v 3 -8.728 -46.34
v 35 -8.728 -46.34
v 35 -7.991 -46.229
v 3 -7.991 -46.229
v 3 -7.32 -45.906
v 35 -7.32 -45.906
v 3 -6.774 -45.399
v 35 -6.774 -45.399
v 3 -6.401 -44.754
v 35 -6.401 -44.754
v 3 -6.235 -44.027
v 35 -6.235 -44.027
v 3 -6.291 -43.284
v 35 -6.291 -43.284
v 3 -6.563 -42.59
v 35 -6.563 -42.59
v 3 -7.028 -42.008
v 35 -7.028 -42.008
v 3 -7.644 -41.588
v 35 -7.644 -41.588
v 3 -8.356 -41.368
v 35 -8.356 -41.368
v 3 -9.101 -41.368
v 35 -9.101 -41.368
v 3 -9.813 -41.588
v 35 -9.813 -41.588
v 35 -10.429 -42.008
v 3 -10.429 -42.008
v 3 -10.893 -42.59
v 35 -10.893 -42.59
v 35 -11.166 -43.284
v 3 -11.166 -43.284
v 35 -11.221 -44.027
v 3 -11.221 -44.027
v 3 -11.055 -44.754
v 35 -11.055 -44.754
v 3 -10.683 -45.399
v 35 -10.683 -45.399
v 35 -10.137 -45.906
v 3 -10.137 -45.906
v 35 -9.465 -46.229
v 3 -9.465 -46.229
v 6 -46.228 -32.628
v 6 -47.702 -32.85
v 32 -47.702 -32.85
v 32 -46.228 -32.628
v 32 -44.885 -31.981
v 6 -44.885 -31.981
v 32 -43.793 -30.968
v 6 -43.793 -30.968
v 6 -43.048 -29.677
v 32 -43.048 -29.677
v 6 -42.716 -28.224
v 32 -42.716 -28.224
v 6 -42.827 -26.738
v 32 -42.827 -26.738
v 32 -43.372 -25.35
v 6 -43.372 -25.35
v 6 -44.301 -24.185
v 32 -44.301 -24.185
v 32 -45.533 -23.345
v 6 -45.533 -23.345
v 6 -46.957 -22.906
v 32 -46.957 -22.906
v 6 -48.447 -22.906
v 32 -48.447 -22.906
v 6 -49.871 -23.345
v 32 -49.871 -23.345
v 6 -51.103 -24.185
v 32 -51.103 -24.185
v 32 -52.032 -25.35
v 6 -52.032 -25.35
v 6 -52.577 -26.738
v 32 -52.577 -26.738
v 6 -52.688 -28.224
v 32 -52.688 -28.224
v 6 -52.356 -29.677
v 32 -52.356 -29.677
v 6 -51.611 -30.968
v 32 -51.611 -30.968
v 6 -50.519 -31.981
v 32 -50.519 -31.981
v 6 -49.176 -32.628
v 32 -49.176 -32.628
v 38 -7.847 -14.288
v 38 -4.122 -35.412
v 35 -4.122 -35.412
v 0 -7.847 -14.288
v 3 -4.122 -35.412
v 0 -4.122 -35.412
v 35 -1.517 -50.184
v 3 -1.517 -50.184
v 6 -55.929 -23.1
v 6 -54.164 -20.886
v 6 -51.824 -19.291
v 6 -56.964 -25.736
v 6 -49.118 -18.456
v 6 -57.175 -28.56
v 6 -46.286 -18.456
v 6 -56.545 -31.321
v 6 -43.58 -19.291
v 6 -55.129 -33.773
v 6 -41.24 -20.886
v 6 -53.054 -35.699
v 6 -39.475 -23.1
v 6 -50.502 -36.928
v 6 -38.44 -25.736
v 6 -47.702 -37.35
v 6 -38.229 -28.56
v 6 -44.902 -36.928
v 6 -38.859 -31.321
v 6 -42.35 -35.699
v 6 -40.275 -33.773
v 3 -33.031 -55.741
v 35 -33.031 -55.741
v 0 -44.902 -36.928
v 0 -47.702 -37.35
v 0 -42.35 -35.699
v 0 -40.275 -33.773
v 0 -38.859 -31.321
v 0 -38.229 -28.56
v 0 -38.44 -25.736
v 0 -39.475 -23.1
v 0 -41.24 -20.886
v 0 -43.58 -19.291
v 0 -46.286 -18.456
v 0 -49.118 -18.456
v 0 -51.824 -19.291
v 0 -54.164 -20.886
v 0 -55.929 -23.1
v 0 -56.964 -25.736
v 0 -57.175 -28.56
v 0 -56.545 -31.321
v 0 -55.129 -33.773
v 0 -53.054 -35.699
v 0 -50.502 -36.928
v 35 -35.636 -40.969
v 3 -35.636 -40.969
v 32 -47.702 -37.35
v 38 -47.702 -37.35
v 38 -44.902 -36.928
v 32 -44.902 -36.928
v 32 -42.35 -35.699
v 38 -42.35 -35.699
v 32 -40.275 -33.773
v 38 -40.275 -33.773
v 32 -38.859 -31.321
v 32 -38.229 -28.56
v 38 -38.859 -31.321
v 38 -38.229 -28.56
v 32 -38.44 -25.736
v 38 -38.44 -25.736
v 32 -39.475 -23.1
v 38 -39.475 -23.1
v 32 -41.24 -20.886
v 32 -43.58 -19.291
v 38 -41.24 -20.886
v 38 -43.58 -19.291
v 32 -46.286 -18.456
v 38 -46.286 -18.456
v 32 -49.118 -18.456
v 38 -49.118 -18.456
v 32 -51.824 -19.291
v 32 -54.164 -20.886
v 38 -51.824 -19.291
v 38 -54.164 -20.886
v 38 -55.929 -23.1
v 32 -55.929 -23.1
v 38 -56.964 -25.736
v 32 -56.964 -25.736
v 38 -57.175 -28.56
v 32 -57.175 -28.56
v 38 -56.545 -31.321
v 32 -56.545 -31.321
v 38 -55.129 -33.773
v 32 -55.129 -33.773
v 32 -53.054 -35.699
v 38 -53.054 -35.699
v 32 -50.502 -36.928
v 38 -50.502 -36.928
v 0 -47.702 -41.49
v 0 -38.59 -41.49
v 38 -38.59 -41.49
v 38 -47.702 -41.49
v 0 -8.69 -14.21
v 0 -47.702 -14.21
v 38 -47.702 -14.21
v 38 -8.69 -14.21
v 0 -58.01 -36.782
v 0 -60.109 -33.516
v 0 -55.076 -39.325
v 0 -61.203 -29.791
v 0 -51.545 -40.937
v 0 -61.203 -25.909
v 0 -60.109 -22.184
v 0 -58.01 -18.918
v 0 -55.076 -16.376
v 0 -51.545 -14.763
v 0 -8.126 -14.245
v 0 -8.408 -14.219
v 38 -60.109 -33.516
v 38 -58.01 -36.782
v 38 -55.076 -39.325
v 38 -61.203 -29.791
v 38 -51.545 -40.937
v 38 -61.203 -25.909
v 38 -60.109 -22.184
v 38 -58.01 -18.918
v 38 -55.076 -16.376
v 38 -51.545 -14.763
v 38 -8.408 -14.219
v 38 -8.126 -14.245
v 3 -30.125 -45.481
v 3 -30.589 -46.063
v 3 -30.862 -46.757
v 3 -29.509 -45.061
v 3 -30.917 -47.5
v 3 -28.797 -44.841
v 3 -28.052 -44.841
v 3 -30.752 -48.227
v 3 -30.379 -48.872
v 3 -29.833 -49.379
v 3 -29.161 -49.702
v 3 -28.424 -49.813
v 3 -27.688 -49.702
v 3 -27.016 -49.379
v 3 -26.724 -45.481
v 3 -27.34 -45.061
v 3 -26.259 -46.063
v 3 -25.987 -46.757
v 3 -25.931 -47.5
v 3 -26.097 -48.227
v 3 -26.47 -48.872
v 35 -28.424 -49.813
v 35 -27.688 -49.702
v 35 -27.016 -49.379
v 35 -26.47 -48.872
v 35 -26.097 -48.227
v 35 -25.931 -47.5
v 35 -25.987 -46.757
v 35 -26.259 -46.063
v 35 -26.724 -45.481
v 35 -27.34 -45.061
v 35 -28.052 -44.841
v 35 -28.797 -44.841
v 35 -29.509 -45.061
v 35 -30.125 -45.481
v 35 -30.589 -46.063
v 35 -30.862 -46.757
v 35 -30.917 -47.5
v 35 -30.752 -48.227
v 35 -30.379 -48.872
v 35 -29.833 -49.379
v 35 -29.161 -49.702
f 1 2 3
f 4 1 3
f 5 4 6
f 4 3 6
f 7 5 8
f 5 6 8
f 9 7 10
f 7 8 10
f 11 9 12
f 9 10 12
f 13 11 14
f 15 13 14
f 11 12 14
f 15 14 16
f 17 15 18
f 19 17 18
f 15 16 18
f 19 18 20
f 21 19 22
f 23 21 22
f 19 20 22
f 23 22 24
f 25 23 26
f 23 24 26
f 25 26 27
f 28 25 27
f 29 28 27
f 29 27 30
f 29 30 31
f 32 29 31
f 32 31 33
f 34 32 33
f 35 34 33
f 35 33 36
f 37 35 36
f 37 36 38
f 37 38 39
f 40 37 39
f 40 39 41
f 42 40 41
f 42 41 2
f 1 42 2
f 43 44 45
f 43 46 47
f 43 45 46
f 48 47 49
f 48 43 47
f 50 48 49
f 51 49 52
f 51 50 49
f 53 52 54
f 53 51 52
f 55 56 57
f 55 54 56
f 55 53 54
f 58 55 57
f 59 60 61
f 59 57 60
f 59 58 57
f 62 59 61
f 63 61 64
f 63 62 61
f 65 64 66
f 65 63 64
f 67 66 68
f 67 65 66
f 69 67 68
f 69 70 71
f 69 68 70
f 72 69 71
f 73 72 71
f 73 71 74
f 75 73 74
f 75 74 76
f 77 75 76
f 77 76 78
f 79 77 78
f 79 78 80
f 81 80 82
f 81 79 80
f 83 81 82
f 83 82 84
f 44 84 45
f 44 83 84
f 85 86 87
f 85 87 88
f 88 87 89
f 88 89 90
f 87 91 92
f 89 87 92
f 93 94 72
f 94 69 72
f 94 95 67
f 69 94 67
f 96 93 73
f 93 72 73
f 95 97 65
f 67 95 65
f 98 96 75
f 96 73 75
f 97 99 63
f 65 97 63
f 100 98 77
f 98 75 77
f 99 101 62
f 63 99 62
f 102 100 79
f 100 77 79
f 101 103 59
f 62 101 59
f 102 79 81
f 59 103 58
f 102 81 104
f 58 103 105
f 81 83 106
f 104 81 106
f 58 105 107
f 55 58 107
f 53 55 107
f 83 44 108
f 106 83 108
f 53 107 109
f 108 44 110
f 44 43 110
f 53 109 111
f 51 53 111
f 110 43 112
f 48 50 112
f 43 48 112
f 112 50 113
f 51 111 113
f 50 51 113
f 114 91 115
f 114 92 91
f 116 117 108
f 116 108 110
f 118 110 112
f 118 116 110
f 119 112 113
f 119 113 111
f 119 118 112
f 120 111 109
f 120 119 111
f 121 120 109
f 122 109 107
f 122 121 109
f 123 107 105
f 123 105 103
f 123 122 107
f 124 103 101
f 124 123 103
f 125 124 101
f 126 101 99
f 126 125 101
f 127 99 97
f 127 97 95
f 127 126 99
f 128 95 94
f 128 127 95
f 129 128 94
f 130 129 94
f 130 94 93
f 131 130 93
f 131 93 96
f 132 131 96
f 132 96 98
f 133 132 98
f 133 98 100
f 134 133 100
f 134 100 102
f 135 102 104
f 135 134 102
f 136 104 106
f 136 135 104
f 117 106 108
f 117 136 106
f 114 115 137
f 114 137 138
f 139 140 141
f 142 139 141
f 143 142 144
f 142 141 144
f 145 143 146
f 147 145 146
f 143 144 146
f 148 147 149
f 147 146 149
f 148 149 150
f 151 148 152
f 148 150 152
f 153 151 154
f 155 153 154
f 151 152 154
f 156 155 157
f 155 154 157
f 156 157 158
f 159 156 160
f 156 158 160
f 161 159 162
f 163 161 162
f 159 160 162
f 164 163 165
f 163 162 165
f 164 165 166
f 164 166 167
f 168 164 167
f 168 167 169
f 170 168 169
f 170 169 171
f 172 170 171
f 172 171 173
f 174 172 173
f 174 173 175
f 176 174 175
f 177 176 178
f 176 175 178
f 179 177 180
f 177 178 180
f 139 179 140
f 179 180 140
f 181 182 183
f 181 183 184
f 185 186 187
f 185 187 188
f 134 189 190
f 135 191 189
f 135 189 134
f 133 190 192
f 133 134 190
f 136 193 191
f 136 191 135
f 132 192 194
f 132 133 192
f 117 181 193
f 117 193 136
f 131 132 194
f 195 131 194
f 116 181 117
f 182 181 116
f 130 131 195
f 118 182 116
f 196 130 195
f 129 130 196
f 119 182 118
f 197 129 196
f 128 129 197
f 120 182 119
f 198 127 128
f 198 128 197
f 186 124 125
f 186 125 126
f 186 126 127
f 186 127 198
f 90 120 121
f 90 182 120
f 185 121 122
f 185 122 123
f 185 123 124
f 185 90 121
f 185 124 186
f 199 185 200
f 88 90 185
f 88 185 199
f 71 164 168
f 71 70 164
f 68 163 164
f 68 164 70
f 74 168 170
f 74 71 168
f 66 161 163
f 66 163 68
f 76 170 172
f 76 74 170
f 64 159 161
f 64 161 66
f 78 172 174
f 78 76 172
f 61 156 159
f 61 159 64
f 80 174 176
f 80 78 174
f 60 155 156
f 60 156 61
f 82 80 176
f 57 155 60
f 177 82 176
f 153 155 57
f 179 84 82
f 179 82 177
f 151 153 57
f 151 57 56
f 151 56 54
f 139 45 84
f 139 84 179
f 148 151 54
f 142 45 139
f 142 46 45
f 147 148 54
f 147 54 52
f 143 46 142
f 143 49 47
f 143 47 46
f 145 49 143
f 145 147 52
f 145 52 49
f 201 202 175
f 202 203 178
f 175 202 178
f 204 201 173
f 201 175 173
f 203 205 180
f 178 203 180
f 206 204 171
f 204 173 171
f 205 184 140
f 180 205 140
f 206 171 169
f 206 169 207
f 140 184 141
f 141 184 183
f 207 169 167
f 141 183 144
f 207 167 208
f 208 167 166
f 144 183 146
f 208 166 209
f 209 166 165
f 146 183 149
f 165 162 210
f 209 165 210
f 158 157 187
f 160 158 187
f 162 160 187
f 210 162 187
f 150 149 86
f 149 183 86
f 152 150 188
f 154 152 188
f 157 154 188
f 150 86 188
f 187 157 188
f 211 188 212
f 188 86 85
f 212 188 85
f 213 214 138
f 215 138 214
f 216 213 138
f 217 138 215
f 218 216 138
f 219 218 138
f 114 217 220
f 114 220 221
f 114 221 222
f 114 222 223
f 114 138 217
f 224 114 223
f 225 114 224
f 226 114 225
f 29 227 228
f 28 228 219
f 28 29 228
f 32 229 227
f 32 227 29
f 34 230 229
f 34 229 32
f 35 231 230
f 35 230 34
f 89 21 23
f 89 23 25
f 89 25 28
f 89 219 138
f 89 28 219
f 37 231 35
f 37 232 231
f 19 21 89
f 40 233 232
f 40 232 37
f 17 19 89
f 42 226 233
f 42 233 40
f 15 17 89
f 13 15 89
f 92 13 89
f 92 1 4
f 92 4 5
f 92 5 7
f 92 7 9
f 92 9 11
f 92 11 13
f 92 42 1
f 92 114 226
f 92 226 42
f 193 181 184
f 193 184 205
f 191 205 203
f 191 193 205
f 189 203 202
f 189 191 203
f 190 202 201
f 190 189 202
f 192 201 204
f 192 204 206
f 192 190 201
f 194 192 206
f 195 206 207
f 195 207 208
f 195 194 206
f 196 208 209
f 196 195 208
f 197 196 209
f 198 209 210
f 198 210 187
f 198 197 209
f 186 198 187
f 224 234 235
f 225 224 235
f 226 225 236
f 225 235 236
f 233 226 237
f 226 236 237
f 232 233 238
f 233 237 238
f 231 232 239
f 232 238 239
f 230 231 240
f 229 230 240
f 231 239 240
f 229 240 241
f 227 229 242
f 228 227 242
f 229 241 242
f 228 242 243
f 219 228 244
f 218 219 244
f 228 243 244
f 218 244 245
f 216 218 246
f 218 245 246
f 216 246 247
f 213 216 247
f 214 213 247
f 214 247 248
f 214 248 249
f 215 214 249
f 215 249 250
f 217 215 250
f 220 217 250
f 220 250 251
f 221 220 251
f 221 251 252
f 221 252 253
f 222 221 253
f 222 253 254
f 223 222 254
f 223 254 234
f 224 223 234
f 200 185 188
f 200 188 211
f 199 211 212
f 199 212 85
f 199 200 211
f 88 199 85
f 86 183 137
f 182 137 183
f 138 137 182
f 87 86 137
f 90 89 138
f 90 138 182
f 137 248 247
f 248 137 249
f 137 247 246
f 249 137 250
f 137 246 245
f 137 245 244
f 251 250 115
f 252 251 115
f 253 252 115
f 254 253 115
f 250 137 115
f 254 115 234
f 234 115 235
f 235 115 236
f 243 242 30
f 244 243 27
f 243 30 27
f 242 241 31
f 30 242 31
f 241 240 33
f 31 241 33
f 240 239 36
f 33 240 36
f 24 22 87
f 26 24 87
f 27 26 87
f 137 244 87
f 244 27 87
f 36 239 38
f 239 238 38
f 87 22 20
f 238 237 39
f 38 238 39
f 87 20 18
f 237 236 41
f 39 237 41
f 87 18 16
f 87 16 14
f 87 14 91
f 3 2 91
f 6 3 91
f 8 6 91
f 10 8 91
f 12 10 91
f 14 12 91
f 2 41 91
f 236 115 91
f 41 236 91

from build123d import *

# Parameters (mm, degrees)
SKETCH1_R           = 5
BOSS_EXTRUDE1_DEPTH = 38
SKETCH2_R           = 9.5
CUT_EXTRUDE1_DEPTH  = 6
SKETCH3_W           = 38
SKETCH3_H           = 38
SKETCH3_W_2         = 32
SKETCH3_H_2         = 32
CUT_EXTRUDE2_DEPTH  = 15
SKETCH4_W           = 38
SKETCH4_H           = 3
CUT_EXTRUDE3_DEPTH  = 31.815956095
SKETCH6_R           = 2.5
CUT_EXTRUDE4_DEPTH  = 36


with BuildPart() as part:
    # Sketch1 → Boss-Extrude1 (new body)
    with BuildSketch(Plane(origin=(0, 0, 0), x_dir=(0, 0, -1), z_dir=(1, 0, 0))):
        with BuildLine():
            Line((18.027765774, -4.140855059), (49.663434225, 1.437366842))
            Line((49.663434225, 1.437366842), (56.262064976, -35.985327773))
            Line((56.262064976, -35.985327773), (41.489948681, -38.590050438))
            Line((41.489948681, -38.590050438), (41.489948681, -47.702008996))
            ThreePointArc((41.489948681, -47.702008996), (27.850151899, -61.341805778), (14.210355117, -47.702008996))
            Line((14.210355117, -47.702008996), (14.210355117, -8.690267924))
            ThreePointArc((14.210355117, -8.690267924), (15.291135012, -5.720849566), (18.027765774, -4.140855059))
        make_face()
        with Locations((27.850151899, -47.702008996)):
            Circle(SKETCH1_R, mode=Mode.SUBTRACT)
    extrude(amount=BOSS_EXTRUDE1_DEPTH)

    # Sketch2 → Cut-Extrude1 (cut)
    with BuildSketch(Plane(origin=(38, 0, 0), x_dir=(0, 0, -1), z_dir=(1, 0, 0))):
        with Locations((27.850151899, -47.702008996)):
            Circle(SKETCH2_R)
    cut_extrude1 = extrude(amount=-CUT_EXTRUDE1_DEPTH, mode=Mode.SUBTRACT)

    # Mirror1: Cut-Extrude1 across plane
    add(cut_extrude1.mirror(Plane(origin=(19, 0, 0), x_dir=(0, 0, 1), z_dir=(1, 0, 0))), mode=Mode.SUBTRACT)

    # Sketch3 → Cut-Extrude2 (cut)
    with BuildSketch(Plane(origin=(0, 8.536289359, -48.411702651), x_dir=(-1, 0, 0), z_dir=(0, 0.173648178, -0.984807753))):
        with Locations((-19, -26.20843484)):
            Rectangle(SKETCH3_W, SKETCH3_H)
        with Locations((-19, -26.20843484)):
            Rectangle(SKETCH3_W_2, SKETCH3_H_2, mode=Mode.SUBTRACT)
    extrude(amount=-CUT_EXTRUDE2_DEPTH, mode=Mode.SUBTRACT)

    # Sketch4 → Cut-Extrude3 (cut, through all)
    with BuildSketch(Plane(origin=(0, 5.931566694, -33.639586356), x_dir=(-1, 0, 0), z_dir=(0, 0.173648178, -0.984807753))):
        with Locations((-19, -8.70843484)):
            Rectangle(SKETCH4_W, SKETCH4_H)
    extrude(amount=-CUT_EXTRUDE3_DEPTH, mode=Mode.SUBTRACT)

    # Sketch6 → Cut-Extrude4 (cut, through all)
    with BuildSketch(Plane(origin=(35, 0, 0), x_dir=(0, 0, -1), z_dir=(1, 0, 0))):
        with Locations((43.840209676, -8.728264268)):
            Circle(SKETCH6_R)
        with Locations((47.31317323, -28.424419328)):
            Circle(SKETCH6_R)
    extrude(amount=-CUT_EXTRUDE4_DEPTH, mode=Mode.SUBTRACT)


solid = part.part
